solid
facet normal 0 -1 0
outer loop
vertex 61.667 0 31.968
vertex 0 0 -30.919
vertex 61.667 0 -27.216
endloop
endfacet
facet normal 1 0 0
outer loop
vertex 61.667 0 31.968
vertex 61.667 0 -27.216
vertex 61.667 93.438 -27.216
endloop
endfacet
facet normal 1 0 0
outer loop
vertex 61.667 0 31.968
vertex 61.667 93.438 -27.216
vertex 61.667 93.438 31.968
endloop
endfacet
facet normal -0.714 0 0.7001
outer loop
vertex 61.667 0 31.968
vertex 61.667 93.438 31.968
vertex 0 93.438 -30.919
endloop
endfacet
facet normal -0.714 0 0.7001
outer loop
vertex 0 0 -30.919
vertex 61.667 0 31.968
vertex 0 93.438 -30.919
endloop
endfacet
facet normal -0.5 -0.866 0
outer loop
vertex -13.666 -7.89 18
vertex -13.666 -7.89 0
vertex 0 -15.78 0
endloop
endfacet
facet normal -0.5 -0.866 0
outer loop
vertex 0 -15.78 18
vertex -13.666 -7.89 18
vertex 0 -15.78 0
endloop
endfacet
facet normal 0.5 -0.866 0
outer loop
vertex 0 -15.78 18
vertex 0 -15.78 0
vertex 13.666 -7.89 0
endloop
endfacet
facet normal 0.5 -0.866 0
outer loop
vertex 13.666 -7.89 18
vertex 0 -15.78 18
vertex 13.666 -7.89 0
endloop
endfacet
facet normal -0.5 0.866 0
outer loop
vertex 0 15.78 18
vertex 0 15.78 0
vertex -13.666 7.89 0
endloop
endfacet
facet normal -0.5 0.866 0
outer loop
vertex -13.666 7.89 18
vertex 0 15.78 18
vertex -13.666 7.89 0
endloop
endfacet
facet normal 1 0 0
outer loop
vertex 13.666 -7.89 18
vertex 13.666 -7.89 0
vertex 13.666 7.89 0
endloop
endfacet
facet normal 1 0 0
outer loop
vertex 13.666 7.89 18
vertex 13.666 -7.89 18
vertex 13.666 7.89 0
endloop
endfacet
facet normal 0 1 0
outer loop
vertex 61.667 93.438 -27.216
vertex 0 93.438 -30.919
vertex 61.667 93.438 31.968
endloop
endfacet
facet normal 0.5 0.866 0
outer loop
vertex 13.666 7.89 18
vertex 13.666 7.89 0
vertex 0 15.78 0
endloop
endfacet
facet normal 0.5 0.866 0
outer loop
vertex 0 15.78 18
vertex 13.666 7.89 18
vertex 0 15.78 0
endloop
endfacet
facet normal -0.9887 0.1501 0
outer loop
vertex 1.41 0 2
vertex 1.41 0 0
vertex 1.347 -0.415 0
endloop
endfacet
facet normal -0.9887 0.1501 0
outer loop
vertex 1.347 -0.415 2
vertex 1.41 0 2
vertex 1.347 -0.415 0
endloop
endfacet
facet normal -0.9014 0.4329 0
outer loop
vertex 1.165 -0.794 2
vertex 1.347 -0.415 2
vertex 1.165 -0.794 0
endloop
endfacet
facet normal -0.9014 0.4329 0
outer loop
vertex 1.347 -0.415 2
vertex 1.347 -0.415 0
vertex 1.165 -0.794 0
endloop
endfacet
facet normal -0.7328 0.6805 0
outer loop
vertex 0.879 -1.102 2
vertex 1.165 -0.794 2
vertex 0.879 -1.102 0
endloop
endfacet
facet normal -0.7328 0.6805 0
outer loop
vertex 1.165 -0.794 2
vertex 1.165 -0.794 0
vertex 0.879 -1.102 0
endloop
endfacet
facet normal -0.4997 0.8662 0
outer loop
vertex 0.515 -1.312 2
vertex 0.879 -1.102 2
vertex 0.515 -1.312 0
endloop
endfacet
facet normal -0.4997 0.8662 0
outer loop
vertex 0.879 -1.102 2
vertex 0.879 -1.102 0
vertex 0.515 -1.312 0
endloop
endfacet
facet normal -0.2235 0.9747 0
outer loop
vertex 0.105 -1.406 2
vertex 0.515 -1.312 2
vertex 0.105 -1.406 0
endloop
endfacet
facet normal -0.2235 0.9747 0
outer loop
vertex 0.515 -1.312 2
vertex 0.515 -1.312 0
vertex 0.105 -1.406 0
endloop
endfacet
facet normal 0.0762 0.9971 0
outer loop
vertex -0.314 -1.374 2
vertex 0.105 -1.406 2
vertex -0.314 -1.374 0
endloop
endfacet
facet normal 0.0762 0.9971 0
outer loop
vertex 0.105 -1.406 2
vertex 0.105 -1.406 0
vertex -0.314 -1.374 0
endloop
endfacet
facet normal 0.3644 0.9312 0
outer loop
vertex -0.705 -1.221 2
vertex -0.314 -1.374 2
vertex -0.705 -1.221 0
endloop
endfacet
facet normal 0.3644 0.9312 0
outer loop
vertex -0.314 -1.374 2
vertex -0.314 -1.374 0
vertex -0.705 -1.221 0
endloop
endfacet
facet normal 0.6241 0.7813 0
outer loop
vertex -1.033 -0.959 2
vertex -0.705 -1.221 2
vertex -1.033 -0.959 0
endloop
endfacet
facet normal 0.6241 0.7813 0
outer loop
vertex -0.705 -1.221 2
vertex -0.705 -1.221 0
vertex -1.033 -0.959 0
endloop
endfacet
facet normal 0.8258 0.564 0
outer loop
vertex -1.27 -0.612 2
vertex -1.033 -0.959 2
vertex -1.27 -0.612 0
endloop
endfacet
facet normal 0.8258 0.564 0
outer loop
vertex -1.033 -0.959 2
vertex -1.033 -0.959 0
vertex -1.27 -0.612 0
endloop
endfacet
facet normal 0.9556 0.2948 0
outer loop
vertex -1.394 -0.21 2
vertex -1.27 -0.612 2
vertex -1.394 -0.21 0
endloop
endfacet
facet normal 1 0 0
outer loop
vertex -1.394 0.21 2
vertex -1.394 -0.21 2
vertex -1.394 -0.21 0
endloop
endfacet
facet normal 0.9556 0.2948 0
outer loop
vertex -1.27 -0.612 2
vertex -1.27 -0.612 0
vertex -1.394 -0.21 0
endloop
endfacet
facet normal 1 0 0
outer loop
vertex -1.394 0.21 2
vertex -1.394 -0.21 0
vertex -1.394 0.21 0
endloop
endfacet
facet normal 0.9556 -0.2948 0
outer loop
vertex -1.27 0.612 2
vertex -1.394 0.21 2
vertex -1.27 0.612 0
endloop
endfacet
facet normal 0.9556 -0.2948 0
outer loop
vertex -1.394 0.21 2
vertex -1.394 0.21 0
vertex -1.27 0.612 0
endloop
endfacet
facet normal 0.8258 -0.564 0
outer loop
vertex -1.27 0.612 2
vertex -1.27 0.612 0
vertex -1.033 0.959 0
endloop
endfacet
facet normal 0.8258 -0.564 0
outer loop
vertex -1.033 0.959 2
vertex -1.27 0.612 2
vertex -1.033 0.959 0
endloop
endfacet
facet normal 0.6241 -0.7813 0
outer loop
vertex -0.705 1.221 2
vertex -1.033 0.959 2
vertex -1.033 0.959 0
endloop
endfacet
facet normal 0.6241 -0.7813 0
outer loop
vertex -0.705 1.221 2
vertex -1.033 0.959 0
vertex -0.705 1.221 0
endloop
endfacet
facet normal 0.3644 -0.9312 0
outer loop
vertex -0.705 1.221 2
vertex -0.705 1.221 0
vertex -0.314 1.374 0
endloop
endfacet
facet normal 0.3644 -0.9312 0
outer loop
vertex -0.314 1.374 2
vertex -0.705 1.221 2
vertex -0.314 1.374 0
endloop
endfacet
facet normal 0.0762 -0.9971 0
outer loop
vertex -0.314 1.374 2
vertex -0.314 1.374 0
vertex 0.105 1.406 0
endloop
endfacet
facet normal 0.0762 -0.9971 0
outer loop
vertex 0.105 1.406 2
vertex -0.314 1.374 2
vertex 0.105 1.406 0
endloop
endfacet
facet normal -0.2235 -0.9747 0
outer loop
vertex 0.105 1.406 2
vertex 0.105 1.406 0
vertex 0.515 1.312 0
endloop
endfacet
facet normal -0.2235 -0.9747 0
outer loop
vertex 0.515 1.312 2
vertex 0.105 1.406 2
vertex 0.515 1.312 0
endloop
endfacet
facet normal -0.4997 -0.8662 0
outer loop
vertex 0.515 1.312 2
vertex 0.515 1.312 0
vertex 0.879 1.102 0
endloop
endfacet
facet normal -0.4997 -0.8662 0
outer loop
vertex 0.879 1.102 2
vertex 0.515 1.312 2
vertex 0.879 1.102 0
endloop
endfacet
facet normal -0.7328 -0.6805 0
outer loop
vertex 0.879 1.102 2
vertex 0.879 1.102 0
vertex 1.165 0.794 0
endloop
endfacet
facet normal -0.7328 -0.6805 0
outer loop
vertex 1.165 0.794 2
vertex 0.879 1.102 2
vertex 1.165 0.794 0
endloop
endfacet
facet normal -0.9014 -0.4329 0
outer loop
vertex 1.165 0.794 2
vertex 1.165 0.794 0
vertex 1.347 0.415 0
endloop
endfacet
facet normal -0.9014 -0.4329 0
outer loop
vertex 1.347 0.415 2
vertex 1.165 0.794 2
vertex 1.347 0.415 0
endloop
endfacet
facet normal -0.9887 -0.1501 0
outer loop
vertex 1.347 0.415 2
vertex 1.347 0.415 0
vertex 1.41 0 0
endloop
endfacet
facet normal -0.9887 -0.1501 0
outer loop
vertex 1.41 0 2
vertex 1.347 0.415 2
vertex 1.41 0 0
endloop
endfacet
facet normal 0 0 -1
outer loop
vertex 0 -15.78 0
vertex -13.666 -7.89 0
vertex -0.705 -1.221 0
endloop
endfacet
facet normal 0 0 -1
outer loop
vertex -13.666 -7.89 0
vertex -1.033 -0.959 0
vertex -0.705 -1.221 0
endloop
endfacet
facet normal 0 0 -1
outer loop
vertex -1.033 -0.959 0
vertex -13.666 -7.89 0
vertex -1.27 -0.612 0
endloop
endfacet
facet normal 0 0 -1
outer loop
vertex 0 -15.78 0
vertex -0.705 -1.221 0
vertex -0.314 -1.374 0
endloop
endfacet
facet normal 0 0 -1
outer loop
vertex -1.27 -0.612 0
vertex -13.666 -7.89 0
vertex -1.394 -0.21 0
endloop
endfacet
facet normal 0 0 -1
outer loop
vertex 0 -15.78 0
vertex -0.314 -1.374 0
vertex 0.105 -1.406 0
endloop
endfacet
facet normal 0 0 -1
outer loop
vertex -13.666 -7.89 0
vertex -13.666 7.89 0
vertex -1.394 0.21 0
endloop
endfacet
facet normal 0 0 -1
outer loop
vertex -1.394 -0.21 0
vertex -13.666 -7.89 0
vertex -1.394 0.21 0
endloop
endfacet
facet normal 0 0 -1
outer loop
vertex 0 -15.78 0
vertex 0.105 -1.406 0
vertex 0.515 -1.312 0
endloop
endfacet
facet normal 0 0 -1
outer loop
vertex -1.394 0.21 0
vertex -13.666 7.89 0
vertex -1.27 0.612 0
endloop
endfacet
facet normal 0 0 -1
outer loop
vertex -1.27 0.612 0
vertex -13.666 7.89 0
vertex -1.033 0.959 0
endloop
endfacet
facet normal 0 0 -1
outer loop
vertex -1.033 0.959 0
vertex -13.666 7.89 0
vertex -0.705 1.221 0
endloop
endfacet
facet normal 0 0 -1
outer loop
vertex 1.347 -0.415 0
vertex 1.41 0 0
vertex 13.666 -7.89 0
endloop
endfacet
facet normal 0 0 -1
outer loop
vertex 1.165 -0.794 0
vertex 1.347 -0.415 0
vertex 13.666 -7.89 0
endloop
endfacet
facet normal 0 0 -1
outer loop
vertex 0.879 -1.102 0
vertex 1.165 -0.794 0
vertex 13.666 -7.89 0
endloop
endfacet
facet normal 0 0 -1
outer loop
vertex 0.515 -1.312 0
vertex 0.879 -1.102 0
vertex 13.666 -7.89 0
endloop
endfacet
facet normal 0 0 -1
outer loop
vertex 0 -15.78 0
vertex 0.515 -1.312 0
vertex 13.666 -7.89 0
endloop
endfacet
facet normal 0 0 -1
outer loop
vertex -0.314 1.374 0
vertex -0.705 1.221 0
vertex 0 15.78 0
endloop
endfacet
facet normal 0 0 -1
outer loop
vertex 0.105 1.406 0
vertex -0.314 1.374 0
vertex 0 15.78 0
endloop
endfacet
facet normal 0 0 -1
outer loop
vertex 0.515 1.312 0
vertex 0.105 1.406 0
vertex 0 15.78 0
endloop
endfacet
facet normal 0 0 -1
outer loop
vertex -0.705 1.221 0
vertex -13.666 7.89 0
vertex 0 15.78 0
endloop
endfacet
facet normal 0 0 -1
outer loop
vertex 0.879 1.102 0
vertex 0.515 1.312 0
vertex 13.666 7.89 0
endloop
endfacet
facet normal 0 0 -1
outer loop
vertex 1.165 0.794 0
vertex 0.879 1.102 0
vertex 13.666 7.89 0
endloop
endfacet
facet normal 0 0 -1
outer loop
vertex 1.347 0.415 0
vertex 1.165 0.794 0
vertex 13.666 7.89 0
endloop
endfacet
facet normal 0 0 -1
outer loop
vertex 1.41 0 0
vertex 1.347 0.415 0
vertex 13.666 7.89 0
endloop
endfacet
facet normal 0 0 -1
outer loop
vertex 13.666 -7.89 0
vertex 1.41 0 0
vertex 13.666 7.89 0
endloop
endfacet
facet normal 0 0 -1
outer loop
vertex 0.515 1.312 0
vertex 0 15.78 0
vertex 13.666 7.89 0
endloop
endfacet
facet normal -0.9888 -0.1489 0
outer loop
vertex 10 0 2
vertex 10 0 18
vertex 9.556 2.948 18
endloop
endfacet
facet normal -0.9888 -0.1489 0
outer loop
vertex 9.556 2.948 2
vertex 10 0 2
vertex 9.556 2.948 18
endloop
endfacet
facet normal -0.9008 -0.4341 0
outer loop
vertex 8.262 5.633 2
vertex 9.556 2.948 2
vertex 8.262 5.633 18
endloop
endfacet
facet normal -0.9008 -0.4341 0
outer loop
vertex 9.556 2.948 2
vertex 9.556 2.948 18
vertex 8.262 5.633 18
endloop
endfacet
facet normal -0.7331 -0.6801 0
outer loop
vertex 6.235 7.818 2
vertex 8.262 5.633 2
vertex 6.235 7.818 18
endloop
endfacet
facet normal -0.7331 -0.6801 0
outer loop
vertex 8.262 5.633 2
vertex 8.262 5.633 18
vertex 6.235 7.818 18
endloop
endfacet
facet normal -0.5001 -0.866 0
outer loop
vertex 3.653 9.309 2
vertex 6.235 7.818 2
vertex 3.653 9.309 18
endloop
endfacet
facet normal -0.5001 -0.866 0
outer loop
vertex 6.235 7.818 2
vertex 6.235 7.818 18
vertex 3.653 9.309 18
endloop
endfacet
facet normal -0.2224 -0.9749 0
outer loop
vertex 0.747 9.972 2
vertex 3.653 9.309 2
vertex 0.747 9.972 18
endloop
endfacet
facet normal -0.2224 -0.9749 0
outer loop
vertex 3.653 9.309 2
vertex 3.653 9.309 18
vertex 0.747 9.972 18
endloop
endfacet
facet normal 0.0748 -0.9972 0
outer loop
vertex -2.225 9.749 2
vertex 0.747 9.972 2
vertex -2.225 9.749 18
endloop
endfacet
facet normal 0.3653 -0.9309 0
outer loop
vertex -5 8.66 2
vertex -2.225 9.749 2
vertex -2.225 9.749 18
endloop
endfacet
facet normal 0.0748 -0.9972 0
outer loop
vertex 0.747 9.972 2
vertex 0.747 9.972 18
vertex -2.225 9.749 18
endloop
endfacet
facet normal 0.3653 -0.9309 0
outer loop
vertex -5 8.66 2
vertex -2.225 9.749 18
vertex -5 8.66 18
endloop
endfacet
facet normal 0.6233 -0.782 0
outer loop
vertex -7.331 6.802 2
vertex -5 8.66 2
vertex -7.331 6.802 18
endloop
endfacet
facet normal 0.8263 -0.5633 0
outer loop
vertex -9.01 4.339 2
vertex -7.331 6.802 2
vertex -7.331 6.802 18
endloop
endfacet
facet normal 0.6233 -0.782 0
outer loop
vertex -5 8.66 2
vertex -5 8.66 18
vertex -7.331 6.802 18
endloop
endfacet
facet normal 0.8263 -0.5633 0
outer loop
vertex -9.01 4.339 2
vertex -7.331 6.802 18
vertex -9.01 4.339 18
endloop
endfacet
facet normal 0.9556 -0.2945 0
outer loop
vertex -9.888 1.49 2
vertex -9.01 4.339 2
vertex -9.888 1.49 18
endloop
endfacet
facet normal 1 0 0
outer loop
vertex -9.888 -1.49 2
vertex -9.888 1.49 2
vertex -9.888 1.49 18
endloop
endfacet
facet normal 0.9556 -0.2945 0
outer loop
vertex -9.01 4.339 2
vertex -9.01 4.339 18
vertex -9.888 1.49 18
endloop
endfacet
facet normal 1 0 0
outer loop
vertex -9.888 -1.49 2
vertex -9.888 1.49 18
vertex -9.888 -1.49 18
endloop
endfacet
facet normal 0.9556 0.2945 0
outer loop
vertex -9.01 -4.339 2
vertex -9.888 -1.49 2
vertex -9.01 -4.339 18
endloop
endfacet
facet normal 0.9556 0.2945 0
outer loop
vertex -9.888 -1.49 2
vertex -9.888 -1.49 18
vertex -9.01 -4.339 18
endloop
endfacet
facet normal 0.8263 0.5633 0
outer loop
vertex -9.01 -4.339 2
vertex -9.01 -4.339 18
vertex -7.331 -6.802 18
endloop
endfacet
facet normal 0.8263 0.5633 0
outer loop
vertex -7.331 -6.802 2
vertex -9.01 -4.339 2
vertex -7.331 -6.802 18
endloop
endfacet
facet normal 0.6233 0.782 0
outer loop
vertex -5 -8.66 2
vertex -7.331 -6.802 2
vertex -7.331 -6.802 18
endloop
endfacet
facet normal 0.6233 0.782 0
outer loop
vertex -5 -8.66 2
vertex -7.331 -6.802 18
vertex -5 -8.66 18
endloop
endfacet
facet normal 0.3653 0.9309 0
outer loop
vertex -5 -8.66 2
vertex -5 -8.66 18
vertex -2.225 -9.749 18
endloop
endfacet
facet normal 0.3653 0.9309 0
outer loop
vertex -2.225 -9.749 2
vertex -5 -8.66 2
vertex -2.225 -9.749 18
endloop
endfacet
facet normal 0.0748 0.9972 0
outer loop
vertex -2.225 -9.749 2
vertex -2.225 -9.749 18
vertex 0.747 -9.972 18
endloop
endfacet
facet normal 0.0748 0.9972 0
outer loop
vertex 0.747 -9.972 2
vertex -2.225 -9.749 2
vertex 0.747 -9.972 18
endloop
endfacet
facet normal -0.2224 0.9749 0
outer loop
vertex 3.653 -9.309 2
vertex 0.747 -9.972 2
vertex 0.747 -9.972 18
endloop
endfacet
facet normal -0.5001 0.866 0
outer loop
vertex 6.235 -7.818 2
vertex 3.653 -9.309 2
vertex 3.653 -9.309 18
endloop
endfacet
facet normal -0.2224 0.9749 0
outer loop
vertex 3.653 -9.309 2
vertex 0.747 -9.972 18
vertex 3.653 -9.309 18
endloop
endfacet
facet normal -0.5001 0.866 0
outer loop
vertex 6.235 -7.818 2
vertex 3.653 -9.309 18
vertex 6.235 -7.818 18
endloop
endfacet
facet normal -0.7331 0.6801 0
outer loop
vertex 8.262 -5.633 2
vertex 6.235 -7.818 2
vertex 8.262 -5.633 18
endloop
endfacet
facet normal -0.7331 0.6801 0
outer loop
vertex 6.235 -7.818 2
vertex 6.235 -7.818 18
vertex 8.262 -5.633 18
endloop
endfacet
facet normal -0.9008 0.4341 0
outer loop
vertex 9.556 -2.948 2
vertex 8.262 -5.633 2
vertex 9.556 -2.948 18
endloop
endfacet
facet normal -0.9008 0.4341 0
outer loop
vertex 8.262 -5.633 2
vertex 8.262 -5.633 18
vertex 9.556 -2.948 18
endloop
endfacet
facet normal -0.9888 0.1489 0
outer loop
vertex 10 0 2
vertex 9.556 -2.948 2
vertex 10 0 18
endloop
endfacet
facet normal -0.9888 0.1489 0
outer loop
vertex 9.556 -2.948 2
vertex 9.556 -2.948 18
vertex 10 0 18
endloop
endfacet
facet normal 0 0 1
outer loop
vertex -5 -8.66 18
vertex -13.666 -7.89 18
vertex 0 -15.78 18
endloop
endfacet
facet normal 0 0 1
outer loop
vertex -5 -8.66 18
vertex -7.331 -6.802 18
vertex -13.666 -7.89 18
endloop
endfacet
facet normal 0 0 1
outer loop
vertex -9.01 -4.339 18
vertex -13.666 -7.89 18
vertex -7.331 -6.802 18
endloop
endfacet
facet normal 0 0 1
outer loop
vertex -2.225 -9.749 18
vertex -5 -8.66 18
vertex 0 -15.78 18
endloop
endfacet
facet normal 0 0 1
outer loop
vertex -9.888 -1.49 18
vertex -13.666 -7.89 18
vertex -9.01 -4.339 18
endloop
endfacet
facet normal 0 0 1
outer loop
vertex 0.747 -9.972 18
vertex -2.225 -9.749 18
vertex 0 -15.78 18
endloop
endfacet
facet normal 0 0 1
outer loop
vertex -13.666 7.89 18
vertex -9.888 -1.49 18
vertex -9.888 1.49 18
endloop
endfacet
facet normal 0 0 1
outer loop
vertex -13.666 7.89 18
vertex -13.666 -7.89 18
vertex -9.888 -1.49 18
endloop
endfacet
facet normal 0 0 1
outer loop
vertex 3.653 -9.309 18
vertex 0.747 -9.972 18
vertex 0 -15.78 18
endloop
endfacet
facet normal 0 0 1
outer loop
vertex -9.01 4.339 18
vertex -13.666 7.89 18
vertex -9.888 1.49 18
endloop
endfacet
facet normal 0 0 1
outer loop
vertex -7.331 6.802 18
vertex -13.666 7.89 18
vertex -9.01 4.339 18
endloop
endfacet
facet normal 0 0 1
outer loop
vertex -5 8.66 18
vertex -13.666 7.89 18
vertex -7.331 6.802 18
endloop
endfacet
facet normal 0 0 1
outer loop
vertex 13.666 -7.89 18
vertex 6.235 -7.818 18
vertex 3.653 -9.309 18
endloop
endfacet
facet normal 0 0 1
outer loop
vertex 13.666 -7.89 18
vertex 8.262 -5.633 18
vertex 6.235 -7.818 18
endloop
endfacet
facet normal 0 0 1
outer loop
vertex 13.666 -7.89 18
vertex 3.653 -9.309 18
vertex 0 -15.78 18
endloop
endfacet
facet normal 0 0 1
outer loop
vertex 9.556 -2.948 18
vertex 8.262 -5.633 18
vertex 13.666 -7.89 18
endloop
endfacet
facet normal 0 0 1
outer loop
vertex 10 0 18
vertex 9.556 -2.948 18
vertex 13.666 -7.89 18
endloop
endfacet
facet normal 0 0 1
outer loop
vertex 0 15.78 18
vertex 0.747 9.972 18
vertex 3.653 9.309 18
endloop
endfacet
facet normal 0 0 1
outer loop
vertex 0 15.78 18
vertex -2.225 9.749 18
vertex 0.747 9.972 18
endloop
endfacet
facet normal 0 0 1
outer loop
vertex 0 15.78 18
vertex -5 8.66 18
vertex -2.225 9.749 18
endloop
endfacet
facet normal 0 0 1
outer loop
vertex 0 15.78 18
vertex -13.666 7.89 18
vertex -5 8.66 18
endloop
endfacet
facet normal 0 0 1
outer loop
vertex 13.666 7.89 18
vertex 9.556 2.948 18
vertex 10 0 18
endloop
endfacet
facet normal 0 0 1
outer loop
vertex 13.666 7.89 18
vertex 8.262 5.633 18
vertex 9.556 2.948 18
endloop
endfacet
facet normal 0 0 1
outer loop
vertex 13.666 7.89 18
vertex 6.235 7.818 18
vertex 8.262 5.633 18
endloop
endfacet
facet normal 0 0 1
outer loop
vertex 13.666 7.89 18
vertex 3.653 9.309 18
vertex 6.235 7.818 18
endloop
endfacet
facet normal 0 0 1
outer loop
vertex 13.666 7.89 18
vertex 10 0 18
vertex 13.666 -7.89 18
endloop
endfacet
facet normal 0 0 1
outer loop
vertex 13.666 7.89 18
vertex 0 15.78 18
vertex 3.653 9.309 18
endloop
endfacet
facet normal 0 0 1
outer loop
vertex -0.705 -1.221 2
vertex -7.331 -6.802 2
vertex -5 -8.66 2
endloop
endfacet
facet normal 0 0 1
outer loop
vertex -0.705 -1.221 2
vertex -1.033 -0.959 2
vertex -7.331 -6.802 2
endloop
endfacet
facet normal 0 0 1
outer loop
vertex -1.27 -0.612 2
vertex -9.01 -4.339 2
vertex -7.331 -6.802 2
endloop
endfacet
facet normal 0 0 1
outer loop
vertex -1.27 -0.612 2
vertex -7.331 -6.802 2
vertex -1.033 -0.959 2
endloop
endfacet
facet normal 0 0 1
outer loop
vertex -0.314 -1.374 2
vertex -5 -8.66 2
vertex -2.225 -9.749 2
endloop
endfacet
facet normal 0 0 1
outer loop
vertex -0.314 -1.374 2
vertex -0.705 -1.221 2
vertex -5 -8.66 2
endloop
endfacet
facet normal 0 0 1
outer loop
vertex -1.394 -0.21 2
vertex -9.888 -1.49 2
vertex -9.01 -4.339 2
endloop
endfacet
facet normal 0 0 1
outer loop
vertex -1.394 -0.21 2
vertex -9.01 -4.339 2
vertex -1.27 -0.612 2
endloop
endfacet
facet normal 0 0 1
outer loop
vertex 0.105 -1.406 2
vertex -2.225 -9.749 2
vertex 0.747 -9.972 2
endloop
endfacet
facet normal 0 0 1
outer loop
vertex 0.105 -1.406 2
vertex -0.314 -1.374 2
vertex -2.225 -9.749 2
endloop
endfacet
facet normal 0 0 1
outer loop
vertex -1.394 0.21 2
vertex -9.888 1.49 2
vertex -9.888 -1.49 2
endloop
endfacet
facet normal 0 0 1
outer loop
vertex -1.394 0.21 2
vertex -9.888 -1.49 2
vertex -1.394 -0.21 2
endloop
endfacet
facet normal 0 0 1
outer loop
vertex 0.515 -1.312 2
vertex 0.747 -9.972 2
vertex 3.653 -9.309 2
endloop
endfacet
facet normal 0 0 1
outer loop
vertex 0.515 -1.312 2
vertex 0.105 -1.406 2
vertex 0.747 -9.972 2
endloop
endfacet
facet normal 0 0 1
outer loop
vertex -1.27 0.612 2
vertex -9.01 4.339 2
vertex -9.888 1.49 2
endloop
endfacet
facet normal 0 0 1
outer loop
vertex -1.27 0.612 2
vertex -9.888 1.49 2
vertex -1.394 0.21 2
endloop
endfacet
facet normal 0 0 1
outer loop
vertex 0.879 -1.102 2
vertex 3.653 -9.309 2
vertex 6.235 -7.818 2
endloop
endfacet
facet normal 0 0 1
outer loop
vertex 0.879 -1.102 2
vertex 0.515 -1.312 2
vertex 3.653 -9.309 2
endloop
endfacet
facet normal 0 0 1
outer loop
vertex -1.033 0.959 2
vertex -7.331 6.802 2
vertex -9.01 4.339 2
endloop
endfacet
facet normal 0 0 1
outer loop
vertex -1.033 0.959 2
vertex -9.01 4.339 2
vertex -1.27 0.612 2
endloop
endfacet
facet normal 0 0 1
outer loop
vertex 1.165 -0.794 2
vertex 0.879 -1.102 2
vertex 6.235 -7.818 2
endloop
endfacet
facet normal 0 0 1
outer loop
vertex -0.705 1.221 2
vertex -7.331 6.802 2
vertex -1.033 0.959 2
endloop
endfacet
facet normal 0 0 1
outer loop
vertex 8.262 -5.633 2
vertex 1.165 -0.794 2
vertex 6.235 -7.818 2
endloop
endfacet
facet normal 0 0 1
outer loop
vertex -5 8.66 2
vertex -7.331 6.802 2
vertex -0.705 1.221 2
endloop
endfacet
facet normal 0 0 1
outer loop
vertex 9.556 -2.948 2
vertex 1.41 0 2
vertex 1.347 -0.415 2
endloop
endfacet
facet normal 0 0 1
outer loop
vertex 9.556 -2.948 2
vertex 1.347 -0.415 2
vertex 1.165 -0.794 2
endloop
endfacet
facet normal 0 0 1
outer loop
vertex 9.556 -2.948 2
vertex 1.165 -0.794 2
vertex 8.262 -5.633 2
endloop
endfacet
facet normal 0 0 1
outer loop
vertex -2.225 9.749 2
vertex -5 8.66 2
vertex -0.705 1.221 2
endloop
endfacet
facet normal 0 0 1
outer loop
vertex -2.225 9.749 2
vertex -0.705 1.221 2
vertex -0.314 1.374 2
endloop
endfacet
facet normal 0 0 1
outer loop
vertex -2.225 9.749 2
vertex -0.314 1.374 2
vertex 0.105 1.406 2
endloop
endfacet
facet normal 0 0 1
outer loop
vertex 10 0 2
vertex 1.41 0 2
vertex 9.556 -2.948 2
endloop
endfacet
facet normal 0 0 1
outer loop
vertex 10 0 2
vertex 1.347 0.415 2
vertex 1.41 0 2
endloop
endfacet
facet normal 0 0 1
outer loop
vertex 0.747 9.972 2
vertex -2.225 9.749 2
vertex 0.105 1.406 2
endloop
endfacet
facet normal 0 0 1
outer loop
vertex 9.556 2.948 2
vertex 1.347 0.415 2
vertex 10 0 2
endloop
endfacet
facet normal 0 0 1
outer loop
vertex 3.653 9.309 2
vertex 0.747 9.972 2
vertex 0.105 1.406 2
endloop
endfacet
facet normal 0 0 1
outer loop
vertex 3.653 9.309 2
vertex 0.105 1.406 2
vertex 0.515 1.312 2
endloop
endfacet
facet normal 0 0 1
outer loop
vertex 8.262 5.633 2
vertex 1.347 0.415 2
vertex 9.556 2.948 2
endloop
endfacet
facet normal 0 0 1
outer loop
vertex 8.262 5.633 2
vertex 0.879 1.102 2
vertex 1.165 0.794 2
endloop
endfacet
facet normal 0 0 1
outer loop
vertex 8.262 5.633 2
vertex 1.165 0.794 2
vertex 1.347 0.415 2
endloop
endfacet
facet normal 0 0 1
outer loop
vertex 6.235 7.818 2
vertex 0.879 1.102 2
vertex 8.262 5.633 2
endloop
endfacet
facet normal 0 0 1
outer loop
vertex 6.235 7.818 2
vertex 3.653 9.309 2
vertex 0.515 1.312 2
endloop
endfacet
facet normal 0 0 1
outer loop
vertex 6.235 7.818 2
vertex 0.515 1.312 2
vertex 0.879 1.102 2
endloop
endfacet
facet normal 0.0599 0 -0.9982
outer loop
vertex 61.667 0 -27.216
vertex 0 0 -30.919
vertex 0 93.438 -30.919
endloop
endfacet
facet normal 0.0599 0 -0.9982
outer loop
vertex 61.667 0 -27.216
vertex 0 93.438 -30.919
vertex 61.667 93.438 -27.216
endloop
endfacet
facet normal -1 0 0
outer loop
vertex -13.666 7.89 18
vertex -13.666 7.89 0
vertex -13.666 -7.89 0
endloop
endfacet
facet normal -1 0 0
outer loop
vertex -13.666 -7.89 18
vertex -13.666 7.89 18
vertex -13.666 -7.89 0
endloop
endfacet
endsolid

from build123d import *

# Parameters (mm, degrees)
F0_R     = 10
F1_DEPTH = 18
F2_R     = 10
F3_DEPTH = 16
F4_R     = 1.409509
F5_DEPTH = 25
F7_DEPTH = 93.437744


with BuildPart() as f1:
    # F0 (on Top) → F1 (new body)
    with BuildSketch(Plane.XY):
        Polygon((13.665644, -7.889864), (13.665644, 7.889864), (0, 15.779727), (-13.665644, 7.889864), (-13.665644, -7.889864), (0, -15.779727), align=None)
        Circle(F0_R, mode=Mode.SUBTRACT)
        Circle(F0_R)
    extrude(amount=F1_DEPTH)

    # F2 (on face) → F3 (cut)
    with BuildSketch(Plane.XY.offset(18)):
        Circle(F2_R)
    extrude(amount=-F3_DEPTH, mode=Mode.SUBTRACT)

    # F4 (on face) → F5 (cut)
    with BuildSketch(Plane(origin=(0, 0, 0), x_dir=(1, 0, 0), z_dir=(0, 0, -1))):
        Circle(F4_R)
    extrude(amount=-F5_DEPTH, mode=Mode.SUBTRACT)


with BuildPart() as f7:
    # F6 (on Front) → F7 (new body)
    with BuildSketch(Plane.XZ):
        Polygon((61.66669, 31.96831), (0, -30.919068), (61.66669, -27.21563), align=None)
    extrude(amount=-F7_DEPTH)


solid = Compound([f1.part, f7.part])
